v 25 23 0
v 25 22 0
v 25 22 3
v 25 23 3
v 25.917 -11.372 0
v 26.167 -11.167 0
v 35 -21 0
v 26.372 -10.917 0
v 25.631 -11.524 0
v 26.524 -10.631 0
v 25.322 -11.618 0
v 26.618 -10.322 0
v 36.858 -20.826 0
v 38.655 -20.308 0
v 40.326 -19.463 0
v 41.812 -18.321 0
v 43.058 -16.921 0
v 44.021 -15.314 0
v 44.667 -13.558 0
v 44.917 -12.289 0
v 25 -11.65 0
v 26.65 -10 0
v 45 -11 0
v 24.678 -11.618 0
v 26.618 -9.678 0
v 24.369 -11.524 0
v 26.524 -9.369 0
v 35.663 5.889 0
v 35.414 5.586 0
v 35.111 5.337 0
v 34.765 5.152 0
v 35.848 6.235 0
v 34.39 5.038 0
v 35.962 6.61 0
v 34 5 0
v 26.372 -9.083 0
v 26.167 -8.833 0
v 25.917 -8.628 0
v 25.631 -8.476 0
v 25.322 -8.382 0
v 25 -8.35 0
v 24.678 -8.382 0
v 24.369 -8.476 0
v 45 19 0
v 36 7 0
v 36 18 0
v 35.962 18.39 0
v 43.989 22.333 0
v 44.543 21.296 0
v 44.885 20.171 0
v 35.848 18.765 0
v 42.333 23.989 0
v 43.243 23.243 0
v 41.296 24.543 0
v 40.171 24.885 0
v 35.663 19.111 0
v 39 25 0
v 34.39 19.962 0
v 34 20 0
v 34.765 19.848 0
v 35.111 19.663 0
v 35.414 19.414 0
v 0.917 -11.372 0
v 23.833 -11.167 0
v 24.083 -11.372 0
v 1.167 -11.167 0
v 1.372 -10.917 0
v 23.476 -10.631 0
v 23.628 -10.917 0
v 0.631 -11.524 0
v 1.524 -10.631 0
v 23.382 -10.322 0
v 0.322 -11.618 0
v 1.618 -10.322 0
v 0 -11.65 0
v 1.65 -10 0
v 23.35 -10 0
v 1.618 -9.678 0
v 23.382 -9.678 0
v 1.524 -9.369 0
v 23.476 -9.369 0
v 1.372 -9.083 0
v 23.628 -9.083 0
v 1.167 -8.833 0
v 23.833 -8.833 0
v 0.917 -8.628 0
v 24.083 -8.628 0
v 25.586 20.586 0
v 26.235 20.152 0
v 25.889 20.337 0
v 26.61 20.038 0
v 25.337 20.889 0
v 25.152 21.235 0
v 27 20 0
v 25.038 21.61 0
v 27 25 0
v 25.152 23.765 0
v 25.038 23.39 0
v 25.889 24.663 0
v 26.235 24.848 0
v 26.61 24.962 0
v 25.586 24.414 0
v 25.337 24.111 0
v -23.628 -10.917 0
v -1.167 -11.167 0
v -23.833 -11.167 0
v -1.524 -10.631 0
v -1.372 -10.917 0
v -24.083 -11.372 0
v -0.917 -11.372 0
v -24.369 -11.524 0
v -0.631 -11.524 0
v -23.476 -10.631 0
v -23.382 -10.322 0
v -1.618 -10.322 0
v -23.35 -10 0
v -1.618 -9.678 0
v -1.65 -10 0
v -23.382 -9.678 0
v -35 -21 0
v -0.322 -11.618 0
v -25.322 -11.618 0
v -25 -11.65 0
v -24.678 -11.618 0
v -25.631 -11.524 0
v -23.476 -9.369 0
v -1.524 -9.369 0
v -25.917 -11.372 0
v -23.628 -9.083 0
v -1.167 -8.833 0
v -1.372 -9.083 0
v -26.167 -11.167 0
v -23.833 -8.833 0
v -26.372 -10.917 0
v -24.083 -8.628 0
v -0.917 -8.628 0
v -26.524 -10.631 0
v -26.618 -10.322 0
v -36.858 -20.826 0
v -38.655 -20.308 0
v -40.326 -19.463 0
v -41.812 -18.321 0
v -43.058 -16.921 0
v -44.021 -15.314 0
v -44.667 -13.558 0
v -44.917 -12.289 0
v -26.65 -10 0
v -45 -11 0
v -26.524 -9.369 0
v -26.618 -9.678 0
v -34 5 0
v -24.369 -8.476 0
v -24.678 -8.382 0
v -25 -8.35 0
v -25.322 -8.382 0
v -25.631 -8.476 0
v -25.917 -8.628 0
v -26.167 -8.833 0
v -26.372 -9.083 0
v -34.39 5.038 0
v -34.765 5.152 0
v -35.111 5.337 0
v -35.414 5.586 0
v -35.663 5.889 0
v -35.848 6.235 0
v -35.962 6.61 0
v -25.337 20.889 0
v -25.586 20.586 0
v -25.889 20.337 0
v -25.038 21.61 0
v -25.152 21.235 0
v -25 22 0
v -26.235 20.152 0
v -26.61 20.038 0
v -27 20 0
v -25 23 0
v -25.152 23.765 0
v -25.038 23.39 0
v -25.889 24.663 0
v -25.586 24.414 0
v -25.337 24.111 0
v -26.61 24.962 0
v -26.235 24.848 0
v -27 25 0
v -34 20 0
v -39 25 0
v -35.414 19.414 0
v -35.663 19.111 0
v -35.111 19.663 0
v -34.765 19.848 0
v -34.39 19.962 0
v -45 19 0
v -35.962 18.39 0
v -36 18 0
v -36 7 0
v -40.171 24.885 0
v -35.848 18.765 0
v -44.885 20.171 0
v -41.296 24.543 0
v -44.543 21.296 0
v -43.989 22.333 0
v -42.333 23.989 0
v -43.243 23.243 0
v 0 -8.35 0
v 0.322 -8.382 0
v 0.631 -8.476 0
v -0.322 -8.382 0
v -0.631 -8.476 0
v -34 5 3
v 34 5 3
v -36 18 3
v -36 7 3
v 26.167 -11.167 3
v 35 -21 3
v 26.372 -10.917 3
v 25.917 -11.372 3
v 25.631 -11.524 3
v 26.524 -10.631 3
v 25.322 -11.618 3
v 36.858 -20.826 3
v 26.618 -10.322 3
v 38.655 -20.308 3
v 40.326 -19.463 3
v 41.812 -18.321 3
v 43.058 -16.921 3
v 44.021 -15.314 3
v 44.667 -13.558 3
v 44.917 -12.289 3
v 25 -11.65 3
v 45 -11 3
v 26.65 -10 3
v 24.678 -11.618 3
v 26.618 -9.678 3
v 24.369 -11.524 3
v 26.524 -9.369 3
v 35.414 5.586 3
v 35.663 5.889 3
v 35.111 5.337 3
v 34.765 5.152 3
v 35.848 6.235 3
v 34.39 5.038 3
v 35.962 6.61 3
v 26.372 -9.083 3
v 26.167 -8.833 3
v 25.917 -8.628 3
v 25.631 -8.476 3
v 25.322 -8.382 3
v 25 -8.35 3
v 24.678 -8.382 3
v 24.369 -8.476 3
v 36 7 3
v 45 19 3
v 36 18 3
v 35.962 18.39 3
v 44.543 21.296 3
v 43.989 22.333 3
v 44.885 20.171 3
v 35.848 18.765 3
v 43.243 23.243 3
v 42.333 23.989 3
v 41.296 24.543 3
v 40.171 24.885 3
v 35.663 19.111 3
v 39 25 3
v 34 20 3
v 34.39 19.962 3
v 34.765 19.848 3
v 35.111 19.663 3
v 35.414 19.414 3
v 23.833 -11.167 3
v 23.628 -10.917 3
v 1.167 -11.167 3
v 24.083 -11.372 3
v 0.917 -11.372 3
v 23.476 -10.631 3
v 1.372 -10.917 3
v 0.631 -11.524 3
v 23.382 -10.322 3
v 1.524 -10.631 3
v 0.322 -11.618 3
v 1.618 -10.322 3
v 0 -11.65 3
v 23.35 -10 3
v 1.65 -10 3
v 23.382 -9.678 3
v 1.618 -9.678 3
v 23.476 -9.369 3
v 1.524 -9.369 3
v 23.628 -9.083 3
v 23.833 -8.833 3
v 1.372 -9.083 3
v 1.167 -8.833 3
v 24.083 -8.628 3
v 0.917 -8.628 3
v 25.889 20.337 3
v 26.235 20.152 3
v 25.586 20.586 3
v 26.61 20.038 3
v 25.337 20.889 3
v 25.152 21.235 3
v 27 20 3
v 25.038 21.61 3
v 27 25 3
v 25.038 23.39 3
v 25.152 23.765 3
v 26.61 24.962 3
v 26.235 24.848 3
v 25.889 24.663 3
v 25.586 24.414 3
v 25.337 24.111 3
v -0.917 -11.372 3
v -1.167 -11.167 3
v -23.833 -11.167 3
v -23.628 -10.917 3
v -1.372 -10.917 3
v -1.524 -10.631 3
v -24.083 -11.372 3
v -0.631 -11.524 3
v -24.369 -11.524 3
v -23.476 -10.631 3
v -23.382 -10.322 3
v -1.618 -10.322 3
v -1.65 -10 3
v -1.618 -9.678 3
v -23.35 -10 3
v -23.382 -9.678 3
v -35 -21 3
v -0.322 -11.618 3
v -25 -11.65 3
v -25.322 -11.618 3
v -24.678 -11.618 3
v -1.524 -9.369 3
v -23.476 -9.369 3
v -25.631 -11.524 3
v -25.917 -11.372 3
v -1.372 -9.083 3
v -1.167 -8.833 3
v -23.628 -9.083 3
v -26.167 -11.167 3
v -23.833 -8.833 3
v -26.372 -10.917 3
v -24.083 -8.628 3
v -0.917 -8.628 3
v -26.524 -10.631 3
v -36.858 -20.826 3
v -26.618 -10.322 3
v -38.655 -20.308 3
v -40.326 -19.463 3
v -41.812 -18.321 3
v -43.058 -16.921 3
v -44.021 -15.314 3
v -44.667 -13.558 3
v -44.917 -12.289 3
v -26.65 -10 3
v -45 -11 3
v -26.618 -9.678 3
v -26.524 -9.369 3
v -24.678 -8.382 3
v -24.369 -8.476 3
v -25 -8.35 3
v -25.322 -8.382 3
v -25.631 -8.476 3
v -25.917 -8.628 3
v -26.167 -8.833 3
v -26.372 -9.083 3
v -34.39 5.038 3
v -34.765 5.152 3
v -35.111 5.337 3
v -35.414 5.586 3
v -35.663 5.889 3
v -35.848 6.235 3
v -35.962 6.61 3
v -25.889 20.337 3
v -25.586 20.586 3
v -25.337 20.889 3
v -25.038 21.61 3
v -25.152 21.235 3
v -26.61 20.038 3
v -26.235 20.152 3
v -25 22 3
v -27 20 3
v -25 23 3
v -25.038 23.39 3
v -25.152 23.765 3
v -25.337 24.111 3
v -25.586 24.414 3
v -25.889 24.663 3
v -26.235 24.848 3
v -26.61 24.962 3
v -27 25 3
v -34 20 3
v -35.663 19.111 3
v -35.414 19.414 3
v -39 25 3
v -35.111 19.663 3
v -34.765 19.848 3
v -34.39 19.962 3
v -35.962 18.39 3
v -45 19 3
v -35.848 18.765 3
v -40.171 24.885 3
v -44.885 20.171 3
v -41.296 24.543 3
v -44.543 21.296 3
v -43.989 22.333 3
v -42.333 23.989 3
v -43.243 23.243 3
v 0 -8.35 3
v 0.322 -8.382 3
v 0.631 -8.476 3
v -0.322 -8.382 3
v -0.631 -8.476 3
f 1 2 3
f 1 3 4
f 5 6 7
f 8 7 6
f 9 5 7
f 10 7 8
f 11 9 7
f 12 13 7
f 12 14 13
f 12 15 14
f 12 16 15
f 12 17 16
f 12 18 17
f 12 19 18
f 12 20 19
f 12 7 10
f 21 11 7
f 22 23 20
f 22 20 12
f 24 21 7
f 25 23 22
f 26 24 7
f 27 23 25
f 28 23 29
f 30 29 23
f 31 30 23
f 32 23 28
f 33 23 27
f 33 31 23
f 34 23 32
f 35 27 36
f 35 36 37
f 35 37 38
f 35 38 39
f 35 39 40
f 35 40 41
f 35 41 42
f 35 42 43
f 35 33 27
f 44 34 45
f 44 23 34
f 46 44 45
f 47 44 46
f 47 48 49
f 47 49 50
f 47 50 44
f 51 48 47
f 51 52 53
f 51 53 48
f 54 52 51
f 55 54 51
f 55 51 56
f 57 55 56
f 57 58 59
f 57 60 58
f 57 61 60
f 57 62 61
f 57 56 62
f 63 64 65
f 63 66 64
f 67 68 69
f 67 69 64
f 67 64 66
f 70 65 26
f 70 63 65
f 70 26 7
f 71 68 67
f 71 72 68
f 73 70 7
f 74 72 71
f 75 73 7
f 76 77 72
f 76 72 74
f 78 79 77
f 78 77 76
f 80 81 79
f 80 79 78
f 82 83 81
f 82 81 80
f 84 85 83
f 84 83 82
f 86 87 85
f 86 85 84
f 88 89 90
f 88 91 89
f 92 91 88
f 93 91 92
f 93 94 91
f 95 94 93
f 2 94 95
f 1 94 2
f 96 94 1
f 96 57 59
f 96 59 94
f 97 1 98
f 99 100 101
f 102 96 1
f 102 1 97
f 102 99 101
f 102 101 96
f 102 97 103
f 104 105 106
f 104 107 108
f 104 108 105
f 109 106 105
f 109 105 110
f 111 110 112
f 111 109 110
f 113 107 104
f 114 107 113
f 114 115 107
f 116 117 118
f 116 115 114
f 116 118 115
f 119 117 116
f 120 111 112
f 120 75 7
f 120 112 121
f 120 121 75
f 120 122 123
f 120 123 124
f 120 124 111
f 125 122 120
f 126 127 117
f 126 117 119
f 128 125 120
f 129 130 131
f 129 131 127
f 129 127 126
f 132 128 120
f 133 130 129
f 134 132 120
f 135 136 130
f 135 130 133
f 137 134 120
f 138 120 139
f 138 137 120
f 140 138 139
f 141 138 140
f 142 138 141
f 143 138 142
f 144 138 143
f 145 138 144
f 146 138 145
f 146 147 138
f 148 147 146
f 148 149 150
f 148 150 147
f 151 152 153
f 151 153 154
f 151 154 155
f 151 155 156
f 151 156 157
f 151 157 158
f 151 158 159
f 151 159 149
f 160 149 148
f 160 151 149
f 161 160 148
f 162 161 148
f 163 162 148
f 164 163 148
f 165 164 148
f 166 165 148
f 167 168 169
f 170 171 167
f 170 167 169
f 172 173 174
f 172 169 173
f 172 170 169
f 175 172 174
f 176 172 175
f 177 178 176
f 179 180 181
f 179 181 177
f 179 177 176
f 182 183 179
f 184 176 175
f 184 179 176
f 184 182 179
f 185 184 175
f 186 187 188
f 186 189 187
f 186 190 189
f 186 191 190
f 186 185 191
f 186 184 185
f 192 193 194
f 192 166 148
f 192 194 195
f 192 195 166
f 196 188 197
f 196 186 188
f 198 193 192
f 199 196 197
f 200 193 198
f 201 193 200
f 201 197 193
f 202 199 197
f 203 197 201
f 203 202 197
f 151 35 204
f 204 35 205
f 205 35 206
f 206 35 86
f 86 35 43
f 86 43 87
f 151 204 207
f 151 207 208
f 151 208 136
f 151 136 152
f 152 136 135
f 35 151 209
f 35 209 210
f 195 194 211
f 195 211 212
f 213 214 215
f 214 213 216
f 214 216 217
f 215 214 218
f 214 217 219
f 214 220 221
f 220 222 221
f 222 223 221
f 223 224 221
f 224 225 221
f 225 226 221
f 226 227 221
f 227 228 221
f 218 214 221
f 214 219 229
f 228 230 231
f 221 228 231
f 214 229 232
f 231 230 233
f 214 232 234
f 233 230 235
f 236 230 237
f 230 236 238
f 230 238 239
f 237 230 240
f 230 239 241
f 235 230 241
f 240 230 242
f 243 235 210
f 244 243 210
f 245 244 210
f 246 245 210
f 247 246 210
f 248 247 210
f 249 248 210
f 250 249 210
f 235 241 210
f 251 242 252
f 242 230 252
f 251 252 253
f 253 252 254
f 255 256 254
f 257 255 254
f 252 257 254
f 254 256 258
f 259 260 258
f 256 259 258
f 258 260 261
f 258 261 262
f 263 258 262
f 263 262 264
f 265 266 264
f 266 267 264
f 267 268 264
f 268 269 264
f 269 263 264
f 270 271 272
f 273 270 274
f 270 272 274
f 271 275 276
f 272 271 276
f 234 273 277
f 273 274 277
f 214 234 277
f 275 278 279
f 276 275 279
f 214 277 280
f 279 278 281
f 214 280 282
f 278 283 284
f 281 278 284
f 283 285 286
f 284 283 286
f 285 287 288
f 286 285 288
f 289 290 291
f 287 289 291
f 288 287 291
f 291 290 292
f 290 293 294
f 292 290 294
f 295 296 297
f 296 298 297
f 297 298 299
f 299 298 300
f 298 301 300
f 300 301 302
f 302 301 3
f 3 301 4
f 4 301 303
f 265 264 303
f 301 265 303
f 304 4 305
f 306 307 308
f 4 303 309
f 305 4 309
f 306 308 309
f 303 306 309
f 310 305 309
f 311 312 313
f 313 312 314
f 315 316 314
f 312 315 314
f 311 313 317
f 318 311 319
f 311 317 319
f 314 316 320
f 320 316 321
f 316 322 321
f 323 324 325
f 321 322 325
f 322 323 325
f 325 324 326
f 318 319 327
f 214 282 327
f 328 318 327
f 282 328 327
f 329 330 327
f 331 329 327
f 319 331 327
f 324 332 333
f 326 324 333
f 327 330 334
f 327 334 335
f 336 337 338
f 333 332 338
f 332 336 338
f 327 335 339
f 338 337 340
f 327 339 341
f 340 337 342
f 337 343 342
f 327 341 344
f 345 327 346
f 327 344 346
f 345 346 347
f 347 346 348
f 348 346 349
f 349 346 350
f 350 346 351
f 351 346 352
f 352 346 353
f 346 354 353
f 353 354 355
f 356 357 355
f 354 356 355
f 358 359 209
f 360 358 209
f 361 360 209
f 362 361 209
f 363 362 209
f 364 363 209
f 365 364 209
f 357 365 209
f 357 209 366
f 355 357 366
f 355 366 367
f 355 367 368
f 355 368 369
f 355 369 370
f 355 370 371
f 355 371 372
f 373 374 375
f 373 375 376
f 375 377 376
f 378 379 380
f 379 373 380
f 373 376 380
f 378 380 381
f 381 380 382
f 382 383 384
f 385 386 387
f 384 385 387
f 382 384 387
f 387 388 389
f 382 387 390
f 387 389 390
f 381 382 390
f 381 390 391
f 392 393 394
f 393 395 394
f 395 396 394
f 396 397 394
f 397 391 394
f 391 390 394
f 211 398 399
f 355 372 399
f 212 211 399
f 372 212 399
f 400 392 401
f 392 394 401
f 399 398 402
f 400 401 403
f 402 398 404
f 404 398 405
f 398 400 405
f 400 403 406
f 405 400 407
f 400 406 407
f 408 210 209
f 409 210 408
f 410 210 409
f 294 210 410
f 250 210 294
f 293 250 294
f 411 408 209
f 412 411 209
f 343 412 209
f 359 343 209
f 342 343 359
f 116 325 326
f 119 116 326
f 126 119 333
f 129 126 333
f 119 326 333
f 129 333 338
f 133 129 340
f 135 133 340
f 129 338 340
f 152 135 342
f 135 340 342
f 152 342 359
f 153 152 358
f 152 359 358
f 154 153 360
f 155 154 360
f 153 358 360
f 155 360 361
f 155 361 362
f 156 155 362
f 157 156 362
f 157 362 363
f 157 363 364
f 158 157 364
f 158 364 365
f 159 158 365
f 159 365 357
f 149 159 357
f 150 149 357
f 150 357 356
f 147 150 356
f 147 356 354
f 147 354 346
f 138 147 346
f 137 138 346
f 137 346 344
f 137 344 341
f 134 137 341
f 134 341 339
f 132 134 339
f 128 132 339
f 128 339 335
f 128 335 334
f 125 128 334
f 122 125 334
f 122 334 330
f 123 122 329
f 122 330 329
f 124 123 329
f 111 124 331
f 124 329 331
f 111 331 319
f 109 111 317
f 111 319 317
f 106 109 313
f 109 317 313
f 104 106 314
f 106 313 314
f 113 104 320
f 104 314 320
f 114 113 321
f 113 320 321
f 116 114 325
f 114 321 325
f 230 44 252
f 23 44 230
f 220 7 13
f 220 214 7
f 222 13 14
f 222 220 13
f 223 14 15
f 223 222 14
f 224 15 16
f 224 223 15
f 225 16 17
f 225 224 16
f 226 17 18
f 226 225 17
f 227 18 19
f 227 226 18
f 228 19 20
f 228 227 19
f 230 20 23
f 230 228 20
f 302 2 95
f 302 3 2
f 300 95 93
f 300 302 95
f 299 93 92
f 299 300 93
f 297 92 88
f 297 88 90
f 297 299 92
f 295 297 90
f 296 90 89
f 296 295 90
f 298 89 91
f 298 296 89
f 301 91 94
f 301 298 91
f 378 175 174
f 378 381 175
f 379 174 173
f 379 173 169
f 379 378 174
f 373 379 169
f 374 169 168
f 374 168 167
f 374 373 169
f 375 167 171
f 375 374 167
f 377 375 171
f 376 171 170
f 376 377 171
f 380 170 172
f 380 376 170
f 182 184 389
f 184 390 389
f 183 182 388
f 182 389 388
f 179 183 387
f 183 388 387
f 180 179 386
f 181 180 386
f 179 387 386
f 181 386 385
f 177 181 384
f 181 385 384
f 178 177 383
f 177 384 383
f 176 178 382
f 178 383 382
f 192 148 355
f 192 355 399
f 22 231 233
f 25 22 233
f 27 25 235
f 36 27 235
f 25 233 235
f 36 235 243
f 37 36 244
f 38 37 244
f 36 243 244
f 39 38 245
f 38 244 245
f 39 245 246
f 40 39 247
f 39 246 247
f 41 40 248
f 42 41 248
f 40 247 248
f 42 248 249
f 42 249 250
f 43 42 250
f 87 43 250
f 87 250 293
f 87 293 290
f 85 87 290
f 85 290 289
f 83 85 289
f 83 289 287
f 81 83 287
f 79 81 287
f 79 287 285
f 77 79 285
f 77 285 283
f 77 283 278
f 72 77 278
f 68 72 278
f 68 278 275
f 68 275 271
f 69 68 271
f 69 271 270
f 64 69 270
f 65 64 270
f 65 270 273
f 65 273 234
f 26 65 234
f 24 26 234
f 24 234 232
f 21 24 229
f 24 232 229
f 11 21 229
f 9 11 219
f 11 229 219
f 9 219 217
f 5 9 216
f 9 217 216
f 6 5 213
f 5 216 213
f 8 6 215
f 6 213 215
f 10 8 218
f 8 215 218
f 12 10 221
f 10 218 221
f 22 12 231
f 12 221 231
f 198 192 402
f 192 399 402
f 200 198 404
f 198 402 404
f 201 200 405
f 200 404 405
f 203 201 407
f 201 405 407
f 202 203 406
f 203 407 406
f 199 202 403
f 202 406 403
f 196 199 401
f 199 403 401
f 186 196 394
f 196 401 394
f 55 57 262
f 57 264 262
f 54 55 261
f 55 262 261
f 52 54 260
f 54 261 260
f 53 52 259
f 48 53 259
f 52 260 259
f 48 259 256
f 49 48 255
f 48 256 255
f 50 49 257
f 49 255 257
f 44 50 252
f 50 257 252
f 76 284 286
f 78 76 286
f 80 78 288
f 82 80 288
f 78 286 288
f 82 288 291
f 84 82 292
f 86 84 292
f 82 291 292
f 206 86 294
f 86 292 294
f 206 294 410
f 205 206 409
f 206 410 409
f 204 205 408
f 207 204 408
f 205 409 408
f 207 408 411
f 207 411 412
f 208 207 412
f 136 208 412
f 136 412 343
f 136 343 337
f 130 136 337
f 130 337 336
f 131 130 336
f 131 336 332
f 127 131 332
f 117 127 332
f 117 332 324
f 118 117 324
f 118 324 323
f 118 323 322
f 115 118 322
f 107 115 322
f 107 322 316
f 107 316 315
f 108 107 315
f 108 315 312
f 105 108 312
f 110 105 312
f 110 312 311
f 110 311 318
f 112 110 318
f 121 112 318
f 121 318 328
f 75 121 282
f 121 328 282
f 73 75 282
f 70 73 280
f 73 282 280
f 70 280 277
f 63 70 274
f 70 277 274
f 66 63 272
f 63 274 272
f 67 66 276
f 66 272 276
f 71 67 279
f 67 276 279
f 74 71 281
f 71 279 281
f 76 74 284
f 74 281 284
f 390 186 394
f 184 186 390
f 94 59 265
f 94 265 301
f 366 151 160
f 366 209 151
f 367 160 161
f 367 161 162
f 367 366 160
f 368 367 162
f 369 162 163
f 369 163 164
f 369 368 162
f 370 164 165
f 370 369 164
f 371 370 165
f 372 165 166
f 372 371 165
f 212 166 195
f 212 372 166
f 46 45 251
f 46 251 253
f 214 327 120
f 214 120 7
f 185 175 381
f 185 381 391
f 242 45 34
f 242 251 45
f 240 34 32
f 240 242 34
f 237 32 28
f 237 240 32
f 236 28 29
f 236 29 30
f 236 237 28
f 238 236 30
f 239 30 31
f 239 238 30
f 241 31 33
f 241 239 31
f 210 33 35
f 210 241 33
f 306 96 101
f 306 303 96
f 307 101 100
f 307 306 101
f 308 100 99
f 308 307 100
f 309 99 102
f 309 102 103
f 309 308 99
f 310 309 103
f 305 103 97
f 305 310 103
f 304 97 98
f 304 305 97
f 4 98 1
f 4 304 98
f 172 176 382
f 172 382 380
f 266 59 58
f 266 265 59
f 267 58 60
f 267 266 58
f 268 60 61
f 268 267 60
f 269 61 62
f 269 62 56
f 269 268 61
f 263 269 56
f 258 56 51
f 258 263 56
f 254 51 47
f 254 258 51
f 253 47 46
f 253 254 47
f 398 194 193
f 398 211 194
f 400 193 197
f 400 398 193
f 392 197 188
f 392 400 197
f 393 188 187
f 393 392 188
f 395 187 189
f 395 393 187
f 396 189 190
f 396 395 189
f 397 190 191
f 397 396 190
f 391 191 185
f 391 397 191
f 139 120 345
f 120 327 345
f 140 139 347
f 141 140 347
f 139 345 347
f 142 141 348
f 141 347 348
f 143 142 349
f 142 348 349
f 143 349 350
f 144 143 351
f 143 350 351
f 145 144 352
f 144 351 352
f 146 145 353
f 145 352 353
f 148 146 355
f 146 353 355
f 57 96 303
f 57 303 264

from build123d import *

# Parameters (mm, degrees)
EXTRUDE_1_DEPTH     = 3
FILLET_1_R          = 6
FILLET_2_R          = 2
SKETCH_2_R          = 1.65
CUT_EXTRUDE_1_DEPTH = 5
FILLET_3_R          = 10
SKETCH_3_W          = 90
SKETCH_3_H          = 4
CUT_EXTRUDE_2_DEPTH = 10
FILLET_4_R          = 10


with BuildPart() as part:
    # 草图1 → 凸台-拉伸1 (new body)
    with BuildSketch(Plane.XY):
        Polygon((25, 25), (45, 25), (45, -25), (-45, -25), (-45, 25), (-25, 25), (-25, 20), (-36, 20), (-36, 5), (36, 5), (36, 20), (25, 20), align=None)
    extrude(amount=EXTRUDE_1_DEPTH)

    # 圆角1
    fillet_1_edges = [part.edges().sort_by_distance(p)[0] for p in [
        (-45, 25, 1.5),
        (45, 25, 1.5),
    ]]
    fillet(fillet_1_edges, radius=FILLET_1_R)

    # 圆角2
    fillet_2_edges = [part.edges().sort_by_distance(p)[0] for p in [
        (-25, 25, 1.5),
        (-25, 20, 1.5),
        (-36, 20, 1.5),
        (-36, 5, 1.5),
        (36, 5, 1.5),
        (36, 20, 1.5),
        (25, 20, 1.5),
        (25, 25, 1.5),
    ]]
    fillet(fillet_2_edges, radius=FILLET_2_R)

    # 草图2 → 切除-拉伸1 (cut)
    with BuildSketch(Plane.XY.offset(3)):
        with Locations((-25, -10)):
            Circle(SKETCH_2_R)
        with Locations((25, -10)):
            Circle(SKETCH_2_R)
        with Locations((0, -10)):
            Circle(SKETCH_2_R)
    extrude(amount=-CUT_EXTRUDE_1_DEPTH, mode=Mode.SUBTRACT)

    # 圆角3
    fillet_3_edges = [part.edges().sort_by_distance(p)[0] for p in [
        (45, -25, 1.5),
        (-45, -25, 1.5),
    ]]
    fillet(fillet_3_edges, radius=FILLET_3_R)

    # 草图3 → 切除-拉伸2 (cut)
    with BuildSketch(Plane.XY.offset(3)):
        with Locations((0, -23)):
            Rectangle(SKETCH_3_W, SKETCH_3_H)
    extrude(amount=-CUT_EXTRUDE_2_DEPTH, mode=Mode.SUBTRACT)

    # 圆角4
    fillet_4_edges = [part.edges().sort_by_distance(p)[0] for p in [
        (43, -21, 1.5),
    ]]
    fillet(fillet_4_edges, radius=FILLET_4_R)
    fillet_4_2_edges = [part.edges().sort_by_distance(p)[0] for p in [
        (-43, -21, 1.5),
    ]]
    fillet(fillet_4_2_edges, radius=FILLET_4_R)


solid = part.part
